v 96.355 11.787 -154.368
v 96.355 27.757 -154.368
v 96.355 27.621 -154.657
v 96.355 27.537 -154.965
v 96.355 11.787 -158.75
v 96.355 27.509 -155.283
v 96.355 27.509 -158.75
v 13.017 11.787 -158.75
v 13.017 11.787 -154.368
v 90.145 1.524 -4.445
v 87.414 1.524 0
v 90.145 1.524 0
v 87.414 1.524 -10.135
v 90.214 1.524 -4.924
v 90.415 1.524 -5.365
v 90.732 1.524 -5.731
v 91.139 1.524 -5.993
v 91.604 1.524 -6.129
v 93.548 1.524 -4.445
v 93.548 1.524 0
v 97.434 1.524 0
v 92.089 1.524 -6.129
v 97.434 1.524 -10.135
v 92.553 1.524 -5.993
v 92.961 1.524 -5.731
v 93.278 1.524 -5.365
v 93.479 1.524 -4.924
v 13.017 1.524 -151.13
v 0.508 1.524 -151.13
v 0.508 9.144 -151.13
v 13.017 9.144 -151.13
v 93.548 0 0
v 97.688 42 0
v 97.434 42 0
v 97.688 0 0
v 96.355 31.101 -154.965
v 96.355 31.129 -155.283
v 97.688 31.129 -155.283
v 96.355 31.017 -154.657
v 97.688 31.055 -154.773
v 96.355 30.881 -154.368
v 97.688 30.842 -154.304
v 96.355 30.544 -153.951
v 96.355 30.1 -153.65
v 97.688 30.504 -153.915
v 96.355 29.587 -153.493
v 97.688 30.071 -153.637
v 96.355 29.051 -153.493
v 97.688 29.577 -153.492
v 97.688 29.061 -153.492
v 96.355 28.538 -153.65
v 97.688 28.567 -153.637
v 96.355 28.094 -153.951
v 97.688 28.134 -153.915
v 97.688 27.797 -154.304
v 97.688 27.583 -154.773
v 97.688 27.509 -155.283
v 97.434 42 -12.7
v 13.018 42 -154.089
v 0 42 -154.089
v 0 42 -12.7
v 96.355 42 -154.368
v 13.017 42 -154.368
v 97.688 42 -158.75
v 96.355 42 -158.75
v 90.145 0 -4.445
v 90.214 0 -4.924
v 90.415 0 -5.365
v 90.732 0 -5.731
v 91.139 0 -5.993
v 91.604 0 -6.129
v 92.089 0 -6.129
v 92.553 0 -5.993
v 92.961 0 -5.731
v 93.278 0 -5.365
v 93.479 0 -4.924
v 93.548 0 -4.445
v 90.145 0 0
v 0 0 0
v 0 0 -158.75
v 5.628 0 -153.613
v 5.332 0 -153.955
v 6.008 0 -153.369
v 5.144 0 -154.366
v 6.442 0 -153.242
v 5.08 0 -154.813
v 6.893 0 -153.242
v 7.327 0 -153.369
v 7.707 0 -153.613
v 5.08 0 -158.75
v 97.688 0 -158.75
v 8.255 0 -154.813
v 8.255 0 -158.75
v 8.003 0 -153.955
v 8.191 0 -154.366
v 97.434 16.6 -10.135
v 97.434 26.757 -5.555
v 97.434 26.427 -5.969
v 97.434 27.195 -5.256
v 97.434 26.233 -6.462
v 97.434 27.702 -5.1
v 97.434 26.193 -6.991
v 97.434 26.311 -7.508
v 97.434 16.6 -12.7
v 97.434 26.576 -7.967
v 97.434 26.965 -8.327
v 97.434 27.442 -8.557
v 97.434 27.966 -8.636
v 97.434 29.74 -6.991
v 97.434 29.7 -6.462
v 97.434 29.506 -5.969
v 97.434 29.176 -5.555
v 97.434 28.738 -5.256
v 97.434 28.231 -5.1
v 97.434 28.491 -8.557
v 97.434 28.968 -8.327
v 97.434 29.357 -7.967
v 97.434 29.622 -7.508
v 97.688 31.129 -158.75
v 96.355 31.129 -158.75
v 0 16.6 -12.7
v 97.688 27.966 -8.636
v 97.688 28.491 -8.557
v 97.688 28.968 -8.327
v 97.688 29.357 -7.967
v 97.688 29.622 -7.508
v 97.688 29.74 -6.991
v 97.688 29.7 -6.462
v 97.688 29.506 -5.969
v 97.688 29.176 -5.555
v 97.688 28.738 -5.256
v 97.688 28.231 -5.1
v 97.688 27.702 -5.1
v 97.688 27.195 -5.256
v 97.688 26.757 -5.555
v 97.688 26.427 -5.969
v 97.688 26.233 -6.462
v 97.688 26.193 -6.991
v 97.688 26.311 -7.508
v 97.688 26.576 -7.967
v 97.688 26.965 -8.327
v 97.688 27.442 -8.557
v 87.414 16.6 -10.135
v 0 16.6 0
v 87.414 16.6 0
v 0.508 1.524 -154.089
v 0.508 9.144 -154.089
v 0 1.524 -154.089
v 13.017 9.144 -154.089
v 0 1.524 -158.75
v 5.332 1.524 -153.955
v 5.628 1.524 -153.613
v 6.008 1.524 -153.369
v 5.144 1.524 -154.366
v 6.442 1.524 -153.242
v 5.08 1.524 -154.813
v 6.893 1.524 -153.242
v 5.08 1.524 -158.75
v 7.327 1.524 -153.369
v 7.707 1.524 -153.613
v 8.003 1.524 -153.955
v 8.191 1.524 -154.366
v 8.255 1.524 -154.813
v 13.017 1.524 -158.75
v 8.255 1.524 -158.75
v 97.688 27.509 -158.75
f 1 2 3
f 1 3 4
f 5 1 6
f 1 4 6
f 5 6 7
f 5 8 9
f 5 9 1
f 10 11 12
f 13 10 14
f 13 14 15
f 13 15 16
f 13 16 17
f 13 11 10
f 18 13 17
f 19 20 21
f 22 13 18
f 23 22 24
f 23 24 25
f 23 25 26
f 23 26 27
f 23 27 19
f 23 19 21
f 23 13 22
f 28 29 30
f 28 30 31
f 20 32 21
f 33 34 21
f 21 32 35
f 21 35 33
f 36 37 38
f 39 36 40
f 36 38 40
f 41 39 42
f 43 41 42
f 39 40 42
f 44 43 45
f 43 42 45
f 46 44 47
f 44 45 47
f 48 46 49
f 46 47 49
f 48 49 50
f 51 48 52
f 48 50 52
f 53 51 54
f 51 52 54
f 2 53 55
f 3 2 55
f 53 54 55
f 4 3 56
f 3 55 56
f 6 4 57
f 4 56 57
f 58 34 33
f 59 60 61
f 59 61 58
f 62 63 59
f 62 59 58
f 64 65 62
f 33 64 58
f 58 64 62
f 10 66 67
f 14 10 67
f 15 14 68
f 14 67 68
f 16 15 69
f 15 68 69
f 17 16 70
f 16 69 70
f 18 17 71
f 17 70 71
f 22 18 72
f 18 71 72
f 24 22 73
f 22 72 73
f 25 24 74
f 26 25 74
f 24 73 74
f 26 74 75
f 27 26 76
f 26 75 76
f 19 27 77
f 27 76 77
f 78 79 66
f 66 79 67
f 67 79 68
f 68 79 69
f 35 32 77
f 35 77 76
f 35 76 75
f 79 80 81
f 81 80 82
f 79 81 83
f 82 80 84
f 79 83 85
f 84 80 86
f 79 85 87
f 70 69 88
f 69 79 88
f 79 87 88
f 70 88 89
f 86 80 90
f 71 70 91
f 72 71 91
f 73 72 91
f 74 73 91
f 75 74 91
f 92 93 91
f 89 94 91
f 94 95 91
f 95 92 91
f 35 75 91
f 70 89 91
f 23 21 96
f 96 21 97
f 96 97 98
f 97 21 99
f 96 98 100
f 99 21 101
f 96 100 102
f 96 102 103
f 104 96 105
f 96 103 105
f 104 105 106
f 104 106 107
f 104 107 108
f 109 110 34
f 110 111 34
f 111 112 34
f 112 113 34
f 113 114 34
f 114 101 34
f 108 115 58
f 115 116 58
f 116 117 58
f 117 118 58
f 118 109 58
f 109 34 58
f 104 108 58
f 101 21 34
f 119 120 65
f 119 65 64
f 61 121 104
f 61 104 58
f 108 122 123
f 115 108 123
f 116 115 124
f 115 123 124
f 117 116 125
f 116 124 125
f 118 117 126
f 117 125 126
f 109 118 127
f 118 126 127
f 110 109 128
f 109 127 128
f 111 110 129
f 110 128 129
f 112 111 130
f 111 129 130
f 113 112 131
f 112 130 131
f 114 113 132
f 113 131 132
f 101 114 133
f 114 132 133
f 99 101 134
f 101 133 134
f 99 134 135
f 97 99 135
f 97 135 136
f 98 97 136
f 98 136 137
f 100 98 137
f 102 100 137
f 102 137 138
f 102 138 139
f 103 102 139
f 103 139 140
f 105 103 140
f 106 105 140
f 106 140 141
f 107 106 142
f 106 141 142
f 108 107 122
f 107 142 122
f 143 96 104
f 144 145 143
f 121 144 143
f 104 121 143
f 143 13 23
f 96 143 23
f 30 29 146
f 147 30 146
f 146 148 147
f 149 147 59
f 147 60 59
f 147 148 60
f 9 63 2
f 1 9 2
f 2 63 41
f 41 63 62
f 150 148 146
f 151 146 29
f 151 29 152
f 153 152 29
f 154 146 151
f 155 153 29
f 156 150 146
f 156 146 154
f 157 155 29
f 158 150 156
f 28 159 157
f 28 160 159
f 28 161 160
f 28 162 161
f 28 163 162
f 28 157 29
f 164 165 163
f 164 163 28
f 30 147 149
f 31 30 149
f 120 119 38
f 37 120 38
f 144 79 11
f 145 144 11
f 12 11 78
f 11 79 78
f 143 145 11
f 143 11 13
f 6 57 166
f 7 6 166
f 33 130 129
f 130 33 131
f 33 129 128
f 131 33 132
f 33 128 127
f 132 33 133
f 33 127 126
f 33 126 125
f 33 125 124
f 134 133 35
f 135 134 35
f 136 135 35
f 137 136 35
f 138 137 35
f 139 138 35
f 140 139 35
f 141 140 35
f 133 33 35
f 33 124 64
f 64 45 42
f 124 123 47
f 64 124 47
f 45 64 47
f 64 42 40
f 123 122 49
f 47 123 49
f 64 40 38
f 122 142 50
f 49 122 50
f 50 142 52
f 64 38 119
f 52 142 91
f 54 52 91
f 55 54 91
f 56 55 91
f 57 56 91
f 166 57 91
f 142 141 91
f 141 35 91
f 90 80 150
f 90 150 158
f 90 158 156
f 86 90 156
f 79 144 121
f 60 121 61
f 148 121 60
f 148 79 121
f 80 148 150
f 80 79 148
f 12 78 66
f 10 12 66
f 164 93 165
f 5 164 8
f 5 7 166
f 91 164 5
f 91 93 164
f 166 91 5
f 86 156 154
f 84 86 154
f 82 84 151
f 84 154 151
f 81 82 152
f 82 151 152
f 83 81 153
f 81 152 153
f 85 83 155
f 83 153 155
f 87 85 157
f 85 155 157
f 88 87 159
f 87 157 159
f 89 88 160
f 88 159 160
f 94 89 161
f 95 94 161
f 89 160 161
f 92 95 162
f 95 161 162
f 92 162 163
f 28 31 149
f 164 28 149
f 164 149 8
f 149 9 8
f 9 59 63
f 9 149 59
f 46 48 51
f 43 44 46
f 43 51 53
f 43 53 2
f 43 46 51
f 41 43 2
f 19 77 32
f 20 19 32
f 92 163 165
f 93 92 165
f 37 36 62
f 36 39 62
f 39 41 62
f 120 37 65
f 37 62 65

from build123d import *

# Parameters (mm, degrees)
SKETCH1_W           = 97.6884
SKETCH1_H           = 158.75
BOSS_EXTRUDE1_DEPTH = 42
CUT_EXTRUDE1_START  = -97.6884
SKETCH2_W           = 12.7
SKETCH2_H           = 25.4
CUT_EXTRUDE1_DEPTH  = 97.4344
SKETCH3_W           = 10.0203
SKETCH3_H           = 10.1346
CUT_EXTRUDE2_DEPTH  = 15.076
SKETCH4_W           = 13.0175
SKETCH4_H           = 4.6609
CUT_EXTRUDE3_DEPTH  = 40.476
SKETCH5_W           = 12.5095
SKETCH5_H           = 7.62
CUT_EXTRUDE4_DEPTH  = 7.62
SKETCH6_W           = 96.3549
SKETCH6_H           = 4.3815
CUT_EXTRUDE5_DEPTH  = 30.2133
CUT_EXTRUDE6_DEPTH  = 191.743001367
CUT_EXTRUDE7_DEPTH  = 1.3335
SKETCH9_R           = 1.778
CUT_EXTRUDE8_DEPTH  = 0.254
CUT_EXTRUDE9_DEPTH  = 1.524


with BuildPart() as part:
    # Sketch1 → Boss-Extrude1 (new body)
    with BuildSketch(Plane(origin=(0, 0, 0), x_dir=(1, 0, 0), z_dir=(0, 1, 0))):
        with Locations((48.8442, 79.375)):
            Rectangle(SKETCH1_W, SKETCH1_H)
    extrude(amount=BOSS_EXTRUDE1_DEPTH)

    # Sketch2 → Cut-Extrude1 (cut)
    with BuildSketch(Plane(origin=(97.6884, 0, 0), x_dir=(0, 0, -1), z_dir=(1, 0, 0)).offset(CUT_EXTRUDE1_START)):
        with Locations((6.35, 29.3)):
            Rectangle(SKETCH2_W, SKETCH2_H)
    extrude(amount=CUT_EXTRUDE1_DEPTH, mode=Mode.SUBTRACT)

    # Sketch3 → Cut-Extrude2 (cut)
    with BuildSketch(Plane(origin=(0, 16.6, 0), x_dir=(1, 0, 0), z_dir=(0, 1, 0))):
        with Locations((92.42425, 5.0673)):
            Rectangle(SKETCH3_W, SKETCH3_H)
    extrude(amount=-CUT_EXTRUDE2_DEPTH, mode=Mode.SUBTRACT)

    # Sketch4 → Cut-Extrude3 (cut)
    with BuildSketch(Plane(origin=(0, 42, 0), x_dir=(1, 0, 0), z_dir=(0, 1, 0))):
        with Locations((6.50875, 156.41955)):
            Rectangle(SKETCH4_W, SKETCH4_H)
    extrude(amount=-CUT_EXTRUDE3_DEPTH, mode=Mode.SUBTRACT)

    # Sketch5 → Cut-Extrude4 (cut)
    with BuildSketch(Plane(origin=(0, 1.524, 0), x_dir=(1, 0, 0), z_dir=(0, 1, 0))):
        with Locations((6.76275, 154.94)):
            Rectangle(SKETCH5_W, SKETCH5_H)
    extrude(amount=CUT_EXTRUDE4_DEPTH, mode=Mode.SUBTRACT)

    # Sketch6 → Cut-Extrude5 (cut)
    with BuildSketch(Plane(origin=(0, 42, 0), x_dir=(1, 0, 0), z_dir=(0, 1, 0))):
        with Locations((48.17745, 156.55925)):
            Rectangle(SKETCH6_W, SKETCH6_H)
    extrude(amount=-CUT_EXTRUDE5_DEPTH, mode=Mode.SUBTRACT)

    # Sketch7 → Cut-Extrude6 (cut, through all)
    with BuildSketch(Plane(origin=(0, 1.524, 0), x_dir=(1, 0, 0), z_dir=(0, 1, 0))):
        with BuildLine():
            Line((5.08, 158.75), (5.08, 154.813))
            ThreePointArc((5.08, 154.813), (6.6675, 153.2255), (8.255, 154.813))
            Line((8.255, 154.813), (8.255, 158.75))
            Line((8.255, 158.75), (5.08, 158.75))
        make_face()
    extrude(amount=-CUT_EXTRUDE6_DEPTH, mode=Mode.SUBTRACT)

    # Sketch8 → Cut-Extrude7 (cut)
    with BuildSketch(Plane(origin=(97.6884, 0, 0), x_dir=(0, 0, -1), z_dir=(1, 0, 0))):
        with BuildLine():
            Line((158.75, 31.1288), (155.2829, 31.1288))
            ThreePointArc((155.2829, 31.1288), (153.47315, 29.31905), (155.2829, 27.5093))
            Line((155.2829, 27.5093), (158.75, 27.5093))
            Line((158.75, 27.5093), (158.75, 31.1288))
        make_face()
    extrude(amount=-CUT_EXTRUDE7_DEPTH, mode=Mode.SUBTRACT)

    # Sketch9 → Cut-Extrude8 (cut)
    with BuildSketch(Plane(origin=(97.6884, 0, 0), x_dir=(0, 0, -1), z_dir=(1, 0, 0))):
        with Locations((6.858, 27.9665)):
            Circle(SKETCH9_R)
    extrude(amount=-CUT_EXTRUDE8_DEPTH, mode=Mode.SUBTRACT)

    # Sketch10 → Cut-Extrude9 (cut)
    with BuildSketch(Plane.XZ):
        with BuildLine():
            Line((93.5482, 0), (90.1446, 0))
            Line((90.1446, 0), (90.1446, -4.445))
            ThreePointArc((90.1446, -4.445), (91.8464, -6.1468), (93.5482, -4.445))
            Line((93.5482, -4.445), (93.5482, 0))
        make_face()
    extrude(amount=-CUT_EXTRUDE9_DEPTH, mode=Mode.SUBTRACT)


solid = part.part
